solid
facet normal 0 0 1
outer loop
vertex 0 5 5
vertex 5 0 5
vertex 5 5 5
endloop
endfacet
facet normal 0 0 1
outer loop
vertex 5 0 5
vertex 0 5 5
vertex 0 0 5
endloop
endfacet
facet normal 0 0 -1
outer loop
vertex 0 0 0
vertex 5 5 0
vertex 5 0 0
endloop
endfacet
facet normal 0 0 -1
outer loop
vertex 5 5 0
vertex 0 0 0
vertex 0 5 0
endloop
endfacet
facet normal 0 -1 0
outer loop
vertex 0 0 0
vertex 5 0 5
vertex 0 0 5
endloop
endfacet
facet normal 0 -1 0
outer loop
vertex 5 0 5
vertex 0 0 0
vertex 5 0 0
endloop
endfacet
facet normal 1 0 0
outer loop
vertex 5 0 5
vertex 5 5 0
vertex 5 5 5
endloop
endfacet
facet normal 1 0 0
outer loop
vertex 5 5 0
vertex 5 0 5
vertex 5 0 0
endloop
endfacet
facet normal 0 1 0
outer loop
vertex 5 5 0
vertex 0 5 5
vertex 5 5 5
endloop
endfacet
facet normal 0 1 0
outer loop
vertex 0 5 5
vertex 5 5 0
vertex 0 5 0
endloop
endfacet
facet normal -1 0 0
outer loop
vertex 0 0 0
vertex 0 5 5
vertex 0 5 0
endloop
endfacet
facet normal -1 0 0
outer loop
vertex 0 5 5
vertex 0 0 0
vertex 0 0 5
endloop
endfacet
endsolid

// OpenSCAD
// Many Projects - Test Fixture: a model at the folder's root.
cube(5);
